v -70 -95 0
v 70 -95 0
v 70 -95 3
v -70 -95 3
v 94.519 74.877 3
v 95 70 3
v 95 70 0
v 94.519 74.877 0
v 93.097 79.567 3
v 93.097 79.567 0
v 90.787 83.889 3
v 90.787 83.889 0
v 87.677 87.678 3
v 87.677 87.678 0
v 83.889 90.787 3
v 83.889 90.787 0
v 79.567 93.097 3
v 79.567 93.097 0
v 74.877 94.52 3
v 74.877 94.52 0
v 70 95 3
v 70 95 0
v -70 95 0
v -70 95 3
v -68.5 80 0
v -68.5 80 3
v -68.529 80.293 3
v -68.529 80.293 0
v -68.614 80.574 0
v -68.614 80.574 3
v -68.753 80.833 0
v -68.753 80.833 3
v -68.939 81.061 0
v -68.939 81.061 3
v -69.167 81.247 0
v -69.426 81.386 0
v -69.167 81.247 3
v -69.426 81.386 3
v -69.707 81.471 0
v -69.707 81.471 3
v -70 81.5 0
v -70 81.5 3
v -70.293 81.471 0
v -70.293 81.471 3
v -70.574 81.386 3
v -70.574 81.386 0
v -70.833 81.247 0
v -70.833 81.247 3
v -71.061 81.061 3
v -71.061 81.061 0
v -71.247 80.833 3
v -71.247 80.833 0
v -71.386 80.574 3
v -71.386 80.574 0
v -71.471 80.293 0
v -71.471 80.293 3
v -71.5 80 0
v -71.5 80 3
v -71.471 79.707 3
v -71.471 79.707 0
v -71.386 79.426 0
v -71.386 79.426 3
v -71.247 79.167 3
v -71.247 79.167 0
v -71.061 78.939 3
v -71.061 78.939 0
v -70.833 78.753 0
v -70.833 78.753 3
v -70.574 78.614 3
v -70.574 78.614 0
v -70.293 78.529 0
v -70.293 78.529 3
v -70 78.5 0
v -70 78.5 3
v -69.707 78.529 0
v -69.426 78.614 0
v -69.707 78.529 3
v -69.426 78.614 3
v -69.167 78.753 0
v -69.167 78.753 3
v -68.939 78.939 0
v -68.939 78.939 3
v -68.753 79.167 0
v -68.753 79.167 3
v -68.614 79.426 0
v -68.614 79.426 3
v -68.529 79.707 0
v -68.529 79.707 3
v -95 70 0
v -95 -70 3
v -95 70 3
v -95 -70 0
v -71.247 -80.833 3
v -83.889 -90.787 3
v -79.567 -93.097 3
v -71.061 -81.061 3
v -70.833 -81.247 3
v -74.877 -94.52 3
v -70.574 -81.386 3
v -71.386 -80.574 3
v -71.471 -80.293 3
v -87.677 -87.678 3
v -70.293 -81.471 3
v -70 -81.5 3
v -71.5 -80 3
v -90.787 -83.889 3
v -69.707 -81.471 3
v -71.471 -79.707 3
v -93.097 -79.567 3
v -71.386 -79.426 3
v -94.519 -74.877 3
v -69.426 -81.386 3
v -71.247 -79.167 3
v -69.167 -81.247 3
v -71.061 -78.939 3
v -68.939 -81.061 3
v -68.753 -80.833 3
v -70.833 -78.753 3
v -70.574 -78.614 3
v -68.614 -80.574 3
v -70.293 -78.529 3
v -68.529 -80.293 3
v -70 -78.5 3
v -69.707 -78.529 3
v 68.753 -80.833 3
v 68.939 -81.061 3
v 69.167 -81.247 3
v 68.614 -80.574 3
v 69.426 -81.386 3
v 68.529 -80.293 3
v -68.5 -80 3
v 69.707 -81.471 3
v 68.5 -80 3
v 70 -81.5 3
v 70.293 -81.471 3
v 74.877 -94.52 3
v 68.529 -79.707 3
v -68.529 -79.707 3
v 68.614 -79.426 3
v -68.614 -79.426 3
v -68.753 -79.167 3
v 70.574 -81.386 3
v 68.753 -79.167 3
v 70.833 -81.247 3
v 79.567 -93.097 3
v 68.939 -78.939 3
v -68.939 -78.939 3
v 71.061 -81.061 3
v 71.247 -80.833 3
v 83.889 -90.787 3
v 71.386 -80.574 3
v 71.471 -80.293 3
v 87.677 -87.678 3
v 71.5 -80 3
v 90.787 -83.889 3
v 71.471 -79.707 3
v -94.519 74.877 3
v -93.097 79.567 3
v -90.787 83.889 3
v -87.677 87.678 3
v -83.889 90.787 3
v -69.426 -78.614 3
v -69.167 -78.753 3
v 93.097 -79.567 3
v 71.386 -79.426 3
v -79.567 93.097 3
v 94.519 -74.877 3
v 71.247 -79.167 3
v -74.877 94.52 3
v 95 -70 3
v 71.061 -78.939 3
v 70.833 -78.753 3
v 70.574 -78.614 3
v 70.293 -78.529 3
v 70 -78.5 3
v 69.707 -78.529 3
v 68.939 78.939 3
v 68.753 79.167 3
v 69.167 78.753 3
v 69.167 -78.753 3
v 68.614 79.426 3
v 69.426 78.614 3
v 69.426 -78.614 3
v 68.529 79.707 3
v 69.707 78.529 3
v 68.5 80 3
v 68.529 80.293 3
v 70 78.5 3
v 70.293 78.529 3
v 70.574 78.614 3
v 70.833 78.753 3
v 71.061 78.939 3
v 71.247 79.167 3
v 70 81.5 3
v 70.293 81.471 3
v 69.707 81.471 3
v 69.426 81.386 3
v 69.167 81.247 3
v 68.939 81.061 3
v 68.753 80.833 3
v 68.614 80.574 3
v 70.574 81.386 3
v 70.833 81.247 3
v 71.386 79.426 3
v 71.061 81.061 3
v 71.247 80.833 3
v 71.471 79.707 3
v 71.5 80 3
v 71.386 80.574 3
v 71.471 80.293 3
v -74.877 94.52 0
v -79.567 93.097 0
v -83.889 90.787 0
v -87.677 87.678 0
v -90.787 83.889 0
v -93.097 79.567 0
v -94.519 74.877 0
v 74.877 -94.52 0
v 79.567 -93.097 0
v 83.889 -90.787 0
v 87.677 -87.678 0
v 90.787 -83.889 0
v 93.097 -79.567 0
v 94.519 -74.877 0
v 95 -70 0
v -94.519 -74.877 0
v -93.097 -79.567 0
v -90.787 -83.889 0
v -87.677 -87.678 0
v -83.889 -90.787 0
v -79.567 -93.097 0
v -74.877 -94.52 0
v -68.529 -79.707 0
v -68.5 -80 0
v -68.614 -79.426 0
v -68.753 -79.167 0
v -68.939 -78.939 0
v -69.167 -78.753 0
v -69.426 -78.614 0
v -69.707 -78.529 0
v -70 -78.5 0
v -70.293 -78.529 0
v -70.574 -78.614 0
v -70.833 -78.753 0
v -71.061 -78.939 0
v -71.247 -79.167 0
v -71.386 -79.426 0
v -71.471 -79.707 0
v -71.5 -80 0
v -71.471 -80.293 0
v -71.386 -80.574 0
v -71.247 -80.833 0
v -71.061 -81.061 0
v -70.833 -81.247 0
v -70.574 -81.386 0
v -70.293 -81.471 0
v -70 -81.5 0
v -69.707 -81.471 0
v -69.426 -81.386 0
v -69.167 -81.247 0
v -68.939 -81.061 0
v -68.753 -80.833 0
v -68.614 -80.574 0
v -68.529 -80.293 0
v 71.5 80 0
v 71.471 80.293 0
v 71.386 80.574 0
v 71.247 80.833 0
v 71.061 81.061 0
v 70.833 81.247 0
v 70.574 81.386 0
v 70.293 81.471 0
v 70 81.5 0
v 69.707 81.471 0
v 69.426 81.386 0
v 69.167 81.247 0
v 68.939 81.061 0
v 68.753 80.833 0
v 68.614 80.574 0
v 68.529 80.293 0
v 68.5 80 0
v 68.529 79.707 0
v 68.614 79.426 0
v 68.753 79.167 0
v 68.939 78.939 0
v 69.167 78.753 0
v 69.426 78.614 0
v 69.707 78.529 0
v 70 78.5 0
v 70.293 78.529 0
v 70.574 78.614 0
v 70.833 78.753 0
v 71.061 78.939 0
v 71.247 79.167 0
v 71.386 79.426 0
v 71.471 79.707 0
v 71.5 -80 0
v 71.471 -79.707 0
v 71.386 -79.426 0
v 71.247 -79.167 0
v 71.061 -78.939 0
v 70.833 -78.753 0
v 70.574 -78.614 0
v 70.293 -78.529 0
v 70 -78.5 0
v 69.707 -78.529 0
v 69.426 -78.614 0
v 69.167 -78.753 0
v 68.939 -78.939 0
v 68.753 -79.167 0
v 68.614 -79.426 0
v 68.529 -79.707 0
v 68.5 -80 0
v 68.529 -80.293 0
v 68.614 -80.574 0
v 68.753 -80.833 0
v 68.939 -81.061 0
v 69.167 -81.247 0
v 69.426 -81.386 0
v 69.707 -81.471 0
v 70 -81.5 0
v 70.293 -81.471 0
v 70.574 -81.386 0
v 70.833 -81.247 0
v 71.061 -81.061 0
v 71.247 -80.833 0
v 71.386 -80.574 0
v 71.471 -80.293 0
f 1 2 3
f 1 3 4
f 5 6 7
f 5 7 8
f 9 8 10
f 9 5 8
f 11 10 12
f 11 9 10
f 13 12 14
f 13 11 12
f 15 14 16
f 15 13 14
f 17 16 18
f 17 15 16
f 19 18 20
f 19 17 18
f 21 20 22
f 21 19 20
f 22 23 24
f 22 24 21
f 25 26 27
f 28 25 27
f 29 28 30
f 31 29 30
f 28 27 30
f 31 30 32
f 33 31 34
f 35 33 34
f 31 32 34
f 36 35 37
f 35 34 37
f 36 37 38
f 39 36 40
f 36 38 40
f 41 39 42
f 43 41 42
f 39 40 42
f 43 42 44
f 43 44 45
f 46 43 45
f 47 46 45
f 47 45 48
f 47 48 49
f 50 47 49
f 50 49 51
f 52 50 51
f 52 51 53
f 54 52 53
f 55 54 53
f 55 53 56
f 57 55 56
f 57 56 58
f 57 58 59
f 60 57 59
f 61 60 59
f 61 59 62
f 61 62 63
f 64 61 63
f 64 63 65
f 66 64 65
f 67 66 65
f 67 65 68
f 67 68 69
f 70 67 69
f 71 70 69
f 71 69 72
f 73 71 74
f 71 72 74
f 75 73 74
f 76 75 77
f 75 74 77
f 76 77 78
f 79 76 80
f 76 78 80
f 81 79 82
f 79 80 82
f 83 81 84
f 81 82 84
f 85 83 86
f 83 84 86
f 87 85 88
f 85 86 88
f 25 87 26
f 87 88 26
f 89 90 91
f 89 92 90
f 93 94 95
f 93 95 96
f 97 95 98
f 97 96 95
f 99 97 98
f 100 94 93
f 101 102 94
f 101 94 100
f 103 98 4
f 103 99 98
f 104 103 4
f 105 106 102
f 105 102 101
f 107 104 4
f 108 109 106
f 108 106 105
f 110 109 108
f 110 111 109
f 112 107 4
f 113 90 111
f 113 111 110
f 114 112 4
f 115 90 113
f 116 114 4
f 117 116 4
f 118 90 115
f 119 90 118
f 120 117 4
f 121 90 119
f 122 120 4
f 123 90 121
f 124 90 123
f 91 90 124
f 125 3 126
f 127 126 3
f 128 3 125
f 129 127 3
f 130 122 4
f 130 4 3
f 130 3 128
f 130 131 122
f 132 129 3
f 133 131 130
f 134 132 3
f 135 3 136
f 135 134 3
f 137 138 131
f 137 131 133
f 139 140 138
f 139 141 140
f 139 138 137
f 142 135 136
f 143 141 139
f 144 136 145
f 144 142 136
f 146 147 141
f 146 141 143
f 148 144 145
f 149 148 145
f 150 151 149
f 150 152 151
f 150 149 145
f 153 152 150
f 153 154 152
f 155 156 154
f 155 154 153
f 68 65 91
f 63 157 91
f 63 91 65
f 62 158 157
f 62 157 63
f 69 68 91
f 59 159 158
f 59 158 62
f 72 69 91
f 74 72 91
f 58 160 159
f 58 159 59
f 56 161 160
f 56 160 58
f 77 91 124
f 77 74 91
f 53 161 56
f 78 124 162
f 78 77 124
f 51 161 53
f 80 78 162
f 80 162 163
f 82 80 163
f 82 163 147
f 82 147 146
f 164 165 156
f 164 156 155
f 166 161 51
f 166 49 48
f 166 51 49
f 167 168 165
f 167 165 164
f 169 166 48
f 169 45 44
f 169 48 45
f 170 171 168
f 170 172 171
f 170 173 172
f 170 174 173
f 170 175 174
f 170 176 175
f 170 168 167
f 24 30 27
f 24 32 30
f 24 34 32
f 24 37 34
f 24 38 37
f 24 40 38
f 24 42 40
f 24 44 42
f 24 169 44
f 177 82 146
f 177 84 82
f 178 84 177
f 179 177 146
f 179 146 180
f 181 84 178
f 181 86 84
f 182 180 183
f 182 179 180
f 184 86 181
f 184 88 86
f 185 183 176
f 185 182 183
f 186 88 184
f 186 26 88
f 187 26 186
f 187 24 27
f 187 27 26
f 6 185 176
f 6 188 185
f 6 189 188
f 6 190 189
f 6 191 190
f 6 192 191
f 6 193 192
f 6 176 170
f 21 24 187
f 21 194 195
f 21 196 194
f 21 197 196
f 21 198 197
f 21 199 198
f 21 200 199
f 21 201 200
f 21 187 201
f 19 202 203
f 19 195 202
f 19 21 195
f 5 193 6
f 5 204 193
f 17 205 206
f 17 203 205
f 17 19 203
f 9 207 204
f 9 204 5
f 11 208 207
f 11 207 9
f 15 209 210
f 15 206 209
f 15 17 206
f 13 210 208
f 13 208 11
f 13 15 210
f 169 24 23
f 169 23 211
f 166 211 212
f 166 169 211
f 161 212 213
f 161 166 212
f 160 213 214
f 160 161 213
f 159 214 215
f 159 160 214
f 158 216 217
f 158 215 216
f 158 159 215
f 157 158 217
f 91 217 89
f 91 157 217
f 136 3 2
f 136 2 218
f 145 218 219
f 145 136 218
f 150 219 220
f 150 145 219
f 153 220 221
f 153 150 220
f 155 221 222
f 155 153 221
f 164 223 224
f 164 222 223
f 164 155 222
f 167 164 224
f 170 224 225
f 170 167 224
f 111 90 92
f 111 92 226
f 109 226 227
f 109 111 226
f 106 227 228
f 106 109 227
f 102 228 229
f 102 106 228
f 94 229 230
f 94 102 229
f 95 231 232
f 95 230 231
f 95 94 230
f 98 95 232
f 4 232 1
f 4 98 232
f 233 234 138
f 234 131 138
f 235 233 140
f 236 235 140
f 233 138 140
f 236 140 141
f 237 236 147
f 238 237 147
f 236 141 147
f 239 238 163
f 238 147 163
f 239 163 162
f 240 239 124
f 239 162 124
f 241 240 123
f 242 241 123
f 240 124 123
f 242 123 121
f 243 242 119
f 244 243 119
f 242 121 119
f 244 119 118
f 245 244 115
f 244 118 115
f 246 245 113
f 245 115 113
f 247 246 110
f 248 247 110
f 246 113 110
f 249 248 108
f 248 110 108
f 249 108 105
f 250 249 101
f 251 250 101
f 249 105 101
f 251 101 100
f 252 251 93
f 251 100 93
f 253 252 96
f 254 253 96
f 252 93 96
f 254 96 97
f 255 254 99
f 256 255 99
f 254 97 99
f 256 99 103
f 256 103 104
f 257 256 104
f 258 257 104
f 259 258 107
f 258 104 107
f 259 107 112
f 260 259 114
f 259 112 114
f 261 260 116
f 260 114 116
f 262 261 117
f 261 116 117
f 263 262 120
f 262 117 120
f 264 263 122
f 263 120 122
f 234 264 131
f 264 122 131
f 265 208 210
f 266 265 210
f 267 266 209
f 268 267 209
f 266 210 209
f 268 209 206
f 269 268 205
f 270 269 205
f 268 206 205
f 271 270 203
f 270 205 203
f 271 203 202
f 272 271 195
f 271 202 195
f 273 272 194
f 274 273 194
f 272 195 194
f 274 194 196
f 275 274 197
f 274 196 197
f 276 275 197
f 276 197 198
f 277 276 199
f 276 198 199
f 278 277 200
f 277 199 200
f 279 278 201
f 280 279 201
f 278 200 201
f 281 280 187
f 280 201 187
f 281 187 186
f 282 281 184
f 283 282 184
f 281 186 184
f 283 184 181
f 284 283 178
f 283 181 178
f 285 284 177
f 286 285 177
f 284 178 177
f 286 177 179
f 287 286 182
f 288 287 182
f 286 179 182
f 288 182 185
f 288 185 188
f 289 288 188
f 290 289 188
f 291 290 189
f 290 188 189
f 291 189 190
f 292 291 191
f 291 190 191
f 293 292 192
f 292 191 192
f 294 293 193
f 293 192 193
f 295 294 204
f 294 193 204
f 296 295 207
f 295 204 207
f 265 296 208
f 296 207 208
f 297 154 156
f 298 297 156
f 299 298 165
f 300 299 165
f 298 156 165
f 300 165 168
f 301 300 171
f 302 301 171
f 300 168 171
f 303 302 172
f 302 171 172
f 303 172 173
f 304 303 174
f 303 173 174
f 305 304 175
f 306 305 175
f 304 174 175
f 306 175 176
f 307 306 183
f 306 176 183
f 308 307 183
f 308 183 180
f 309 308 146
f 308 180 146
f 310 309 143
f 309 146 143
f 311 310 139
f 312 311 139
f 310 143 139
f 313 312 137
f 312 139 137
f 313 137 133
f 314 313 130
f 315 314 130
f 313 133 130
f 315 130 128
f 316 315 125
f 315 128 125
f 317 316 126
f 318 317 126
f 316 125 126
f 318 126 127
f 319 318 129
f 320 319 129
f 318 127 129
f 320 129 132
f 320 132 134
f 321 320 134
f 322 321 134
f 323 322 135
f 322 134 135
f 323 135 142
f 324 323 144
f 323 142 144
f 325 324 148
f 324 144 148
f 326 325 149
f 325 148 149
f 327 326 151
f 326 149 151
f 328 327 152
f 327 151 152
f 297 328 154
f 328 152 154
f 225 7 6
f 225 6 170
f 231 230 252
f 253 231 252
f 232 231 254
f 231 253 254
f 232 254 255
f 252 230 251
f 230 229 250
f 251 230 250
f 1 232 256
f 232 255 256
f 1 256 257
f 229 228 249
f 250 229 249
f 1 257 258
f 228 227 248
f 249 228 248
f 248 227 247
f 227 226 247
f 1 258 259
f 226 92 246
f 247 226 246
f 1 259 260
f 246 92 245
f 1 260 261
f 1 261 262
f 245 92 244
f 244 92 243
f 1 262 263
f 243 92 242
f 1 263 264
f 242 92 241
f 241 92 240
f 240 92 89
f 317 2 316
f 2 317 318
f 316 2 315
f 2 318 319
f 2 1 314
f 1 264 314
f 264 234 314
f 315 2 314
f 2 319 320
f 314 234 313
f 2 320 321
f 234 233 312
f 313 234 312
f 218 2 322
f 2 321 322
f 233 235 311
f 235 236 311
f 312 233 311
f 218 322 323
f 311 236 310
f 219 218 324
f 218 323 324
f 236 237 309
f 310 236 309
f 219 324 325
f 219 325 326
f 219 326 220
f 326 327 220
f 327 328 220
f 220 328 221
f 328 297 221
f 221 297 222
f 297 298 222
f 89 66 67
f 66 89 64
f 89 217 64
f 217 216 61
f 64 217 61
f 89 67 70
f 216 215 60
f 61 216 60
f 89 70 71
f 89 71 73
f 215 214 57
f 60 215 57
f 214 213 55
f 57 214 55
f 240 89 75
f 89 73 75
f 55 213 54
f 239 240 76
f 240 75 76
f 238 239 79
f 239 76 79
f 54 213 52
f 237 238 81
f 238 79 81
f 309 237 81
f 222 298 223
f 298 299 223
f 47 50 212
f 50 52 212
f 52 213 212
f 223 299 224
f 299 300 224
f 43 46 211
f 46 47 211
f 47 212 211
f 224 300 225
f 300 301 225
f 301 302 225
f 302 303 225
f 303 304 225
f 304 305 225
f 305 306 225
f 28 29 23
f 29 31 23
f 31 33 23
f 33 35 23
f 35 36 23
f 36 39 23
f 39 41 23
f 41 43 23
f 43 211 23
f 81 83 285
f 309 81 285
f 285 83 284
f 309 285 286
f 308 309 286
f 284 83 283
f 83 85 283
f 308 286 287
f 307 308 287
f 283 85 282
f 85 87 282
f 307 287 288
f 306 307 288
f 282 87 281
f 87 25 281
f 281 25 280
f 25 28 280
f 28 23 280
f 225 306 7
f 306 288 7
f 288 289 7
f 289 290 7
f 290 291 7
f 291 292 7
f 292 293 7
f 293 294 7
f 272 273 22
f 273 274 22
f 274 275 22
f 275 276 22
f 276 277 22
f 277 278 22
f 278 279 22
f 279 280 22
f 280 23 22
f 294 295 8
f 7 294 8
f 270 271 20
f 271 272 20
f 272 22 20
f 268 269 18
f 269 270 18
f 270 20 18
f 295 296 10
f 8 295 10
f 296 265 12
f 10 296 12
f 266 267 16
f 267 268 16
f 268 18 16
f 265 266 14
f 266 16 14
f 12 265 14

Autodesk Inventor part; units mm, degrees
ref_plane "YZ Plane" through (0, 0, 0) normal (1, 0, 0) x (0, 1, 0)
ref_plane "XZ Plane" through (0, 0, 0) normal (0, 1, 0) x (-1, 0, 0)
ref_plane "XY Plane" through (0, 0, 0) normal (0, 0, 1) x (1, 0, 0)
sketch "Sketch1" plane through (0, 0, 0) normal (0, 0, 1) x (1, 0, 0)
  point P0 (0, 0)
sketch "Sketch2" plane through (0, 0, 0) normal (0, 0, 1) x (1, 0, 0)
  line L0 (94.9998, -95.0001) -> (-94.9998, -95.0001)
  line L1 (-94.9998, -95.0001) -> (-94.9998, 95.0001)
  line L2 (-94.9998, 95.0001) -> (94.9998, 95.0001)
  line L3 (94.9998, 95.0001) -> (94.9998, -95.0001)
  line L4 (94.9998, -95.0001) -> (-94.9998, 95.0001) construction
  line L5 (-94.9998, -95.0001) -> (94.9998, 95.0001) construction
  point P0 (0, 0)
extrude "Extrusion1" add sketch "Sketch2" along normal blind 3
sketch "Sketch3" plane through (0, 0, 3) normal (0, 0, 1) x (1, 0, 0)
  circle A0 centre (70, 80) radius 1.5001
  circle A1 centre (70, -80) radius 1.5001
  circle A2 centre (-70, 80) radius 1.5001
  circle A3 centre (-70, -80) radius 1.5001
extrude "Extrusion2" cut sketch "Sketch3" against normal blind 3
fillet "Fillet1" radius 25 1 edges at (94.9998, 95.0001, 1.5)
fillet "Fillet2" radius 25 1 edges at (94.9998, -95.0001, 1.5)
fillet "Fillet3" radius 25 1 edges at (-94.9998, -95.0001, 1.5)
fillet "Fillet4" radius 25 1 edges at (-94.9998, 95.0001, 1.5)
sketch "Pi mount holes" plane through (0, 0, 3) normal (0, 0, 1) x (1, 0, 0)
  circle A0 centre (24, -30.5) radius 1.2502
  circle A1 centre (-34, -30.5) radius 1.2502
  circle A2 centre (-34, -79.5) radius 1.2502
  circle A3 centre (24, -79.5) radius 1.2502
sketch "B205 mount holes" plane through (0, 0, 3) normal (0, 0, 1) x (1, 0, 0)
  circle A0 centre (20.32, 30.48) radius 1.5002
  circle A1 centre (-45.72, 30.48) radius 1.5002
  circle A2 centre (-45.72, -12.7) radius 1.5002
  circle A3 centre (20.32, -12.7) radius 1.5002
sketch "RM3100 mount holes" plane through (0, 0, 3) normal (0, 0, 1) x (1, 0, 0)
  circle A0 centre (0, 9) radius 0.9999
  circle A1 centre (0, -9) radius 0.9999
sketch "Pololu mount holes" plane through (0, 0, 3) normal (0, 0, 1) x (1, 0, 0)
  circle A0 centre (-73.2965, -23.9932) radius 1.1973
  circle A1 centre (-88.2965, -23.9932) radius 1.1973
  circle A2 centre (-73.2965, -59.4932) radius 1.1973
  circle A3 centre (-88.2965, -59.4932) radius 1.1973
sketch "B205 cable cutout" plane through (0, 0, 3) normal (0, 0, 1) x (1, 0, 0)
  line L0 (-76.0426, -14.5593) -> (-76.0426, 37.4411) construction
  line L1 (-81.5424, -9.0595) -> (-81.5424, 31.9413)
  line L2 (-70.5428, 31.9413) -> (-70.5428, -9.0595)
  arc A0 (-81.5424, -9.0595) -> (-70.5428, -9.0595) centre (-76.0426, -9.0595) ccw
  arc A1 (-70.5428, 31.9413) -> (-81.5424, 31.9413) centre (-76.0426, 31.9413) ccw
  point P0 (0, 0)
  point P1 (-76.0426, 11.4409)
sketch "Pi cable cutout" plane through (0, 0, 3) normal (0, 0, 1) x (1, 0, 0)
  line L0 (65.7382, -60.7056) -> (65.7382, 5.2939) construction
  line L1 (60.7378, -55.7052) -> (60.7378, 0.2935)
  line L2 (70.7387, 0.2935) -> (70.7387, -55.7052)
  arc A0 (60.7378, -55.7052) -> (70.7387, -55.7052) centre (65.7382, -55.7052) ccw
  arc A1 (70.7387, 0.2935) -> (60.7378, 0.2935) centre (65.7382, 0.2935) ccw
  point P0 (0, 0)
  point P1 (65.7382, -27.7058)
properties part number "payload_bay_square_drill_holes"
